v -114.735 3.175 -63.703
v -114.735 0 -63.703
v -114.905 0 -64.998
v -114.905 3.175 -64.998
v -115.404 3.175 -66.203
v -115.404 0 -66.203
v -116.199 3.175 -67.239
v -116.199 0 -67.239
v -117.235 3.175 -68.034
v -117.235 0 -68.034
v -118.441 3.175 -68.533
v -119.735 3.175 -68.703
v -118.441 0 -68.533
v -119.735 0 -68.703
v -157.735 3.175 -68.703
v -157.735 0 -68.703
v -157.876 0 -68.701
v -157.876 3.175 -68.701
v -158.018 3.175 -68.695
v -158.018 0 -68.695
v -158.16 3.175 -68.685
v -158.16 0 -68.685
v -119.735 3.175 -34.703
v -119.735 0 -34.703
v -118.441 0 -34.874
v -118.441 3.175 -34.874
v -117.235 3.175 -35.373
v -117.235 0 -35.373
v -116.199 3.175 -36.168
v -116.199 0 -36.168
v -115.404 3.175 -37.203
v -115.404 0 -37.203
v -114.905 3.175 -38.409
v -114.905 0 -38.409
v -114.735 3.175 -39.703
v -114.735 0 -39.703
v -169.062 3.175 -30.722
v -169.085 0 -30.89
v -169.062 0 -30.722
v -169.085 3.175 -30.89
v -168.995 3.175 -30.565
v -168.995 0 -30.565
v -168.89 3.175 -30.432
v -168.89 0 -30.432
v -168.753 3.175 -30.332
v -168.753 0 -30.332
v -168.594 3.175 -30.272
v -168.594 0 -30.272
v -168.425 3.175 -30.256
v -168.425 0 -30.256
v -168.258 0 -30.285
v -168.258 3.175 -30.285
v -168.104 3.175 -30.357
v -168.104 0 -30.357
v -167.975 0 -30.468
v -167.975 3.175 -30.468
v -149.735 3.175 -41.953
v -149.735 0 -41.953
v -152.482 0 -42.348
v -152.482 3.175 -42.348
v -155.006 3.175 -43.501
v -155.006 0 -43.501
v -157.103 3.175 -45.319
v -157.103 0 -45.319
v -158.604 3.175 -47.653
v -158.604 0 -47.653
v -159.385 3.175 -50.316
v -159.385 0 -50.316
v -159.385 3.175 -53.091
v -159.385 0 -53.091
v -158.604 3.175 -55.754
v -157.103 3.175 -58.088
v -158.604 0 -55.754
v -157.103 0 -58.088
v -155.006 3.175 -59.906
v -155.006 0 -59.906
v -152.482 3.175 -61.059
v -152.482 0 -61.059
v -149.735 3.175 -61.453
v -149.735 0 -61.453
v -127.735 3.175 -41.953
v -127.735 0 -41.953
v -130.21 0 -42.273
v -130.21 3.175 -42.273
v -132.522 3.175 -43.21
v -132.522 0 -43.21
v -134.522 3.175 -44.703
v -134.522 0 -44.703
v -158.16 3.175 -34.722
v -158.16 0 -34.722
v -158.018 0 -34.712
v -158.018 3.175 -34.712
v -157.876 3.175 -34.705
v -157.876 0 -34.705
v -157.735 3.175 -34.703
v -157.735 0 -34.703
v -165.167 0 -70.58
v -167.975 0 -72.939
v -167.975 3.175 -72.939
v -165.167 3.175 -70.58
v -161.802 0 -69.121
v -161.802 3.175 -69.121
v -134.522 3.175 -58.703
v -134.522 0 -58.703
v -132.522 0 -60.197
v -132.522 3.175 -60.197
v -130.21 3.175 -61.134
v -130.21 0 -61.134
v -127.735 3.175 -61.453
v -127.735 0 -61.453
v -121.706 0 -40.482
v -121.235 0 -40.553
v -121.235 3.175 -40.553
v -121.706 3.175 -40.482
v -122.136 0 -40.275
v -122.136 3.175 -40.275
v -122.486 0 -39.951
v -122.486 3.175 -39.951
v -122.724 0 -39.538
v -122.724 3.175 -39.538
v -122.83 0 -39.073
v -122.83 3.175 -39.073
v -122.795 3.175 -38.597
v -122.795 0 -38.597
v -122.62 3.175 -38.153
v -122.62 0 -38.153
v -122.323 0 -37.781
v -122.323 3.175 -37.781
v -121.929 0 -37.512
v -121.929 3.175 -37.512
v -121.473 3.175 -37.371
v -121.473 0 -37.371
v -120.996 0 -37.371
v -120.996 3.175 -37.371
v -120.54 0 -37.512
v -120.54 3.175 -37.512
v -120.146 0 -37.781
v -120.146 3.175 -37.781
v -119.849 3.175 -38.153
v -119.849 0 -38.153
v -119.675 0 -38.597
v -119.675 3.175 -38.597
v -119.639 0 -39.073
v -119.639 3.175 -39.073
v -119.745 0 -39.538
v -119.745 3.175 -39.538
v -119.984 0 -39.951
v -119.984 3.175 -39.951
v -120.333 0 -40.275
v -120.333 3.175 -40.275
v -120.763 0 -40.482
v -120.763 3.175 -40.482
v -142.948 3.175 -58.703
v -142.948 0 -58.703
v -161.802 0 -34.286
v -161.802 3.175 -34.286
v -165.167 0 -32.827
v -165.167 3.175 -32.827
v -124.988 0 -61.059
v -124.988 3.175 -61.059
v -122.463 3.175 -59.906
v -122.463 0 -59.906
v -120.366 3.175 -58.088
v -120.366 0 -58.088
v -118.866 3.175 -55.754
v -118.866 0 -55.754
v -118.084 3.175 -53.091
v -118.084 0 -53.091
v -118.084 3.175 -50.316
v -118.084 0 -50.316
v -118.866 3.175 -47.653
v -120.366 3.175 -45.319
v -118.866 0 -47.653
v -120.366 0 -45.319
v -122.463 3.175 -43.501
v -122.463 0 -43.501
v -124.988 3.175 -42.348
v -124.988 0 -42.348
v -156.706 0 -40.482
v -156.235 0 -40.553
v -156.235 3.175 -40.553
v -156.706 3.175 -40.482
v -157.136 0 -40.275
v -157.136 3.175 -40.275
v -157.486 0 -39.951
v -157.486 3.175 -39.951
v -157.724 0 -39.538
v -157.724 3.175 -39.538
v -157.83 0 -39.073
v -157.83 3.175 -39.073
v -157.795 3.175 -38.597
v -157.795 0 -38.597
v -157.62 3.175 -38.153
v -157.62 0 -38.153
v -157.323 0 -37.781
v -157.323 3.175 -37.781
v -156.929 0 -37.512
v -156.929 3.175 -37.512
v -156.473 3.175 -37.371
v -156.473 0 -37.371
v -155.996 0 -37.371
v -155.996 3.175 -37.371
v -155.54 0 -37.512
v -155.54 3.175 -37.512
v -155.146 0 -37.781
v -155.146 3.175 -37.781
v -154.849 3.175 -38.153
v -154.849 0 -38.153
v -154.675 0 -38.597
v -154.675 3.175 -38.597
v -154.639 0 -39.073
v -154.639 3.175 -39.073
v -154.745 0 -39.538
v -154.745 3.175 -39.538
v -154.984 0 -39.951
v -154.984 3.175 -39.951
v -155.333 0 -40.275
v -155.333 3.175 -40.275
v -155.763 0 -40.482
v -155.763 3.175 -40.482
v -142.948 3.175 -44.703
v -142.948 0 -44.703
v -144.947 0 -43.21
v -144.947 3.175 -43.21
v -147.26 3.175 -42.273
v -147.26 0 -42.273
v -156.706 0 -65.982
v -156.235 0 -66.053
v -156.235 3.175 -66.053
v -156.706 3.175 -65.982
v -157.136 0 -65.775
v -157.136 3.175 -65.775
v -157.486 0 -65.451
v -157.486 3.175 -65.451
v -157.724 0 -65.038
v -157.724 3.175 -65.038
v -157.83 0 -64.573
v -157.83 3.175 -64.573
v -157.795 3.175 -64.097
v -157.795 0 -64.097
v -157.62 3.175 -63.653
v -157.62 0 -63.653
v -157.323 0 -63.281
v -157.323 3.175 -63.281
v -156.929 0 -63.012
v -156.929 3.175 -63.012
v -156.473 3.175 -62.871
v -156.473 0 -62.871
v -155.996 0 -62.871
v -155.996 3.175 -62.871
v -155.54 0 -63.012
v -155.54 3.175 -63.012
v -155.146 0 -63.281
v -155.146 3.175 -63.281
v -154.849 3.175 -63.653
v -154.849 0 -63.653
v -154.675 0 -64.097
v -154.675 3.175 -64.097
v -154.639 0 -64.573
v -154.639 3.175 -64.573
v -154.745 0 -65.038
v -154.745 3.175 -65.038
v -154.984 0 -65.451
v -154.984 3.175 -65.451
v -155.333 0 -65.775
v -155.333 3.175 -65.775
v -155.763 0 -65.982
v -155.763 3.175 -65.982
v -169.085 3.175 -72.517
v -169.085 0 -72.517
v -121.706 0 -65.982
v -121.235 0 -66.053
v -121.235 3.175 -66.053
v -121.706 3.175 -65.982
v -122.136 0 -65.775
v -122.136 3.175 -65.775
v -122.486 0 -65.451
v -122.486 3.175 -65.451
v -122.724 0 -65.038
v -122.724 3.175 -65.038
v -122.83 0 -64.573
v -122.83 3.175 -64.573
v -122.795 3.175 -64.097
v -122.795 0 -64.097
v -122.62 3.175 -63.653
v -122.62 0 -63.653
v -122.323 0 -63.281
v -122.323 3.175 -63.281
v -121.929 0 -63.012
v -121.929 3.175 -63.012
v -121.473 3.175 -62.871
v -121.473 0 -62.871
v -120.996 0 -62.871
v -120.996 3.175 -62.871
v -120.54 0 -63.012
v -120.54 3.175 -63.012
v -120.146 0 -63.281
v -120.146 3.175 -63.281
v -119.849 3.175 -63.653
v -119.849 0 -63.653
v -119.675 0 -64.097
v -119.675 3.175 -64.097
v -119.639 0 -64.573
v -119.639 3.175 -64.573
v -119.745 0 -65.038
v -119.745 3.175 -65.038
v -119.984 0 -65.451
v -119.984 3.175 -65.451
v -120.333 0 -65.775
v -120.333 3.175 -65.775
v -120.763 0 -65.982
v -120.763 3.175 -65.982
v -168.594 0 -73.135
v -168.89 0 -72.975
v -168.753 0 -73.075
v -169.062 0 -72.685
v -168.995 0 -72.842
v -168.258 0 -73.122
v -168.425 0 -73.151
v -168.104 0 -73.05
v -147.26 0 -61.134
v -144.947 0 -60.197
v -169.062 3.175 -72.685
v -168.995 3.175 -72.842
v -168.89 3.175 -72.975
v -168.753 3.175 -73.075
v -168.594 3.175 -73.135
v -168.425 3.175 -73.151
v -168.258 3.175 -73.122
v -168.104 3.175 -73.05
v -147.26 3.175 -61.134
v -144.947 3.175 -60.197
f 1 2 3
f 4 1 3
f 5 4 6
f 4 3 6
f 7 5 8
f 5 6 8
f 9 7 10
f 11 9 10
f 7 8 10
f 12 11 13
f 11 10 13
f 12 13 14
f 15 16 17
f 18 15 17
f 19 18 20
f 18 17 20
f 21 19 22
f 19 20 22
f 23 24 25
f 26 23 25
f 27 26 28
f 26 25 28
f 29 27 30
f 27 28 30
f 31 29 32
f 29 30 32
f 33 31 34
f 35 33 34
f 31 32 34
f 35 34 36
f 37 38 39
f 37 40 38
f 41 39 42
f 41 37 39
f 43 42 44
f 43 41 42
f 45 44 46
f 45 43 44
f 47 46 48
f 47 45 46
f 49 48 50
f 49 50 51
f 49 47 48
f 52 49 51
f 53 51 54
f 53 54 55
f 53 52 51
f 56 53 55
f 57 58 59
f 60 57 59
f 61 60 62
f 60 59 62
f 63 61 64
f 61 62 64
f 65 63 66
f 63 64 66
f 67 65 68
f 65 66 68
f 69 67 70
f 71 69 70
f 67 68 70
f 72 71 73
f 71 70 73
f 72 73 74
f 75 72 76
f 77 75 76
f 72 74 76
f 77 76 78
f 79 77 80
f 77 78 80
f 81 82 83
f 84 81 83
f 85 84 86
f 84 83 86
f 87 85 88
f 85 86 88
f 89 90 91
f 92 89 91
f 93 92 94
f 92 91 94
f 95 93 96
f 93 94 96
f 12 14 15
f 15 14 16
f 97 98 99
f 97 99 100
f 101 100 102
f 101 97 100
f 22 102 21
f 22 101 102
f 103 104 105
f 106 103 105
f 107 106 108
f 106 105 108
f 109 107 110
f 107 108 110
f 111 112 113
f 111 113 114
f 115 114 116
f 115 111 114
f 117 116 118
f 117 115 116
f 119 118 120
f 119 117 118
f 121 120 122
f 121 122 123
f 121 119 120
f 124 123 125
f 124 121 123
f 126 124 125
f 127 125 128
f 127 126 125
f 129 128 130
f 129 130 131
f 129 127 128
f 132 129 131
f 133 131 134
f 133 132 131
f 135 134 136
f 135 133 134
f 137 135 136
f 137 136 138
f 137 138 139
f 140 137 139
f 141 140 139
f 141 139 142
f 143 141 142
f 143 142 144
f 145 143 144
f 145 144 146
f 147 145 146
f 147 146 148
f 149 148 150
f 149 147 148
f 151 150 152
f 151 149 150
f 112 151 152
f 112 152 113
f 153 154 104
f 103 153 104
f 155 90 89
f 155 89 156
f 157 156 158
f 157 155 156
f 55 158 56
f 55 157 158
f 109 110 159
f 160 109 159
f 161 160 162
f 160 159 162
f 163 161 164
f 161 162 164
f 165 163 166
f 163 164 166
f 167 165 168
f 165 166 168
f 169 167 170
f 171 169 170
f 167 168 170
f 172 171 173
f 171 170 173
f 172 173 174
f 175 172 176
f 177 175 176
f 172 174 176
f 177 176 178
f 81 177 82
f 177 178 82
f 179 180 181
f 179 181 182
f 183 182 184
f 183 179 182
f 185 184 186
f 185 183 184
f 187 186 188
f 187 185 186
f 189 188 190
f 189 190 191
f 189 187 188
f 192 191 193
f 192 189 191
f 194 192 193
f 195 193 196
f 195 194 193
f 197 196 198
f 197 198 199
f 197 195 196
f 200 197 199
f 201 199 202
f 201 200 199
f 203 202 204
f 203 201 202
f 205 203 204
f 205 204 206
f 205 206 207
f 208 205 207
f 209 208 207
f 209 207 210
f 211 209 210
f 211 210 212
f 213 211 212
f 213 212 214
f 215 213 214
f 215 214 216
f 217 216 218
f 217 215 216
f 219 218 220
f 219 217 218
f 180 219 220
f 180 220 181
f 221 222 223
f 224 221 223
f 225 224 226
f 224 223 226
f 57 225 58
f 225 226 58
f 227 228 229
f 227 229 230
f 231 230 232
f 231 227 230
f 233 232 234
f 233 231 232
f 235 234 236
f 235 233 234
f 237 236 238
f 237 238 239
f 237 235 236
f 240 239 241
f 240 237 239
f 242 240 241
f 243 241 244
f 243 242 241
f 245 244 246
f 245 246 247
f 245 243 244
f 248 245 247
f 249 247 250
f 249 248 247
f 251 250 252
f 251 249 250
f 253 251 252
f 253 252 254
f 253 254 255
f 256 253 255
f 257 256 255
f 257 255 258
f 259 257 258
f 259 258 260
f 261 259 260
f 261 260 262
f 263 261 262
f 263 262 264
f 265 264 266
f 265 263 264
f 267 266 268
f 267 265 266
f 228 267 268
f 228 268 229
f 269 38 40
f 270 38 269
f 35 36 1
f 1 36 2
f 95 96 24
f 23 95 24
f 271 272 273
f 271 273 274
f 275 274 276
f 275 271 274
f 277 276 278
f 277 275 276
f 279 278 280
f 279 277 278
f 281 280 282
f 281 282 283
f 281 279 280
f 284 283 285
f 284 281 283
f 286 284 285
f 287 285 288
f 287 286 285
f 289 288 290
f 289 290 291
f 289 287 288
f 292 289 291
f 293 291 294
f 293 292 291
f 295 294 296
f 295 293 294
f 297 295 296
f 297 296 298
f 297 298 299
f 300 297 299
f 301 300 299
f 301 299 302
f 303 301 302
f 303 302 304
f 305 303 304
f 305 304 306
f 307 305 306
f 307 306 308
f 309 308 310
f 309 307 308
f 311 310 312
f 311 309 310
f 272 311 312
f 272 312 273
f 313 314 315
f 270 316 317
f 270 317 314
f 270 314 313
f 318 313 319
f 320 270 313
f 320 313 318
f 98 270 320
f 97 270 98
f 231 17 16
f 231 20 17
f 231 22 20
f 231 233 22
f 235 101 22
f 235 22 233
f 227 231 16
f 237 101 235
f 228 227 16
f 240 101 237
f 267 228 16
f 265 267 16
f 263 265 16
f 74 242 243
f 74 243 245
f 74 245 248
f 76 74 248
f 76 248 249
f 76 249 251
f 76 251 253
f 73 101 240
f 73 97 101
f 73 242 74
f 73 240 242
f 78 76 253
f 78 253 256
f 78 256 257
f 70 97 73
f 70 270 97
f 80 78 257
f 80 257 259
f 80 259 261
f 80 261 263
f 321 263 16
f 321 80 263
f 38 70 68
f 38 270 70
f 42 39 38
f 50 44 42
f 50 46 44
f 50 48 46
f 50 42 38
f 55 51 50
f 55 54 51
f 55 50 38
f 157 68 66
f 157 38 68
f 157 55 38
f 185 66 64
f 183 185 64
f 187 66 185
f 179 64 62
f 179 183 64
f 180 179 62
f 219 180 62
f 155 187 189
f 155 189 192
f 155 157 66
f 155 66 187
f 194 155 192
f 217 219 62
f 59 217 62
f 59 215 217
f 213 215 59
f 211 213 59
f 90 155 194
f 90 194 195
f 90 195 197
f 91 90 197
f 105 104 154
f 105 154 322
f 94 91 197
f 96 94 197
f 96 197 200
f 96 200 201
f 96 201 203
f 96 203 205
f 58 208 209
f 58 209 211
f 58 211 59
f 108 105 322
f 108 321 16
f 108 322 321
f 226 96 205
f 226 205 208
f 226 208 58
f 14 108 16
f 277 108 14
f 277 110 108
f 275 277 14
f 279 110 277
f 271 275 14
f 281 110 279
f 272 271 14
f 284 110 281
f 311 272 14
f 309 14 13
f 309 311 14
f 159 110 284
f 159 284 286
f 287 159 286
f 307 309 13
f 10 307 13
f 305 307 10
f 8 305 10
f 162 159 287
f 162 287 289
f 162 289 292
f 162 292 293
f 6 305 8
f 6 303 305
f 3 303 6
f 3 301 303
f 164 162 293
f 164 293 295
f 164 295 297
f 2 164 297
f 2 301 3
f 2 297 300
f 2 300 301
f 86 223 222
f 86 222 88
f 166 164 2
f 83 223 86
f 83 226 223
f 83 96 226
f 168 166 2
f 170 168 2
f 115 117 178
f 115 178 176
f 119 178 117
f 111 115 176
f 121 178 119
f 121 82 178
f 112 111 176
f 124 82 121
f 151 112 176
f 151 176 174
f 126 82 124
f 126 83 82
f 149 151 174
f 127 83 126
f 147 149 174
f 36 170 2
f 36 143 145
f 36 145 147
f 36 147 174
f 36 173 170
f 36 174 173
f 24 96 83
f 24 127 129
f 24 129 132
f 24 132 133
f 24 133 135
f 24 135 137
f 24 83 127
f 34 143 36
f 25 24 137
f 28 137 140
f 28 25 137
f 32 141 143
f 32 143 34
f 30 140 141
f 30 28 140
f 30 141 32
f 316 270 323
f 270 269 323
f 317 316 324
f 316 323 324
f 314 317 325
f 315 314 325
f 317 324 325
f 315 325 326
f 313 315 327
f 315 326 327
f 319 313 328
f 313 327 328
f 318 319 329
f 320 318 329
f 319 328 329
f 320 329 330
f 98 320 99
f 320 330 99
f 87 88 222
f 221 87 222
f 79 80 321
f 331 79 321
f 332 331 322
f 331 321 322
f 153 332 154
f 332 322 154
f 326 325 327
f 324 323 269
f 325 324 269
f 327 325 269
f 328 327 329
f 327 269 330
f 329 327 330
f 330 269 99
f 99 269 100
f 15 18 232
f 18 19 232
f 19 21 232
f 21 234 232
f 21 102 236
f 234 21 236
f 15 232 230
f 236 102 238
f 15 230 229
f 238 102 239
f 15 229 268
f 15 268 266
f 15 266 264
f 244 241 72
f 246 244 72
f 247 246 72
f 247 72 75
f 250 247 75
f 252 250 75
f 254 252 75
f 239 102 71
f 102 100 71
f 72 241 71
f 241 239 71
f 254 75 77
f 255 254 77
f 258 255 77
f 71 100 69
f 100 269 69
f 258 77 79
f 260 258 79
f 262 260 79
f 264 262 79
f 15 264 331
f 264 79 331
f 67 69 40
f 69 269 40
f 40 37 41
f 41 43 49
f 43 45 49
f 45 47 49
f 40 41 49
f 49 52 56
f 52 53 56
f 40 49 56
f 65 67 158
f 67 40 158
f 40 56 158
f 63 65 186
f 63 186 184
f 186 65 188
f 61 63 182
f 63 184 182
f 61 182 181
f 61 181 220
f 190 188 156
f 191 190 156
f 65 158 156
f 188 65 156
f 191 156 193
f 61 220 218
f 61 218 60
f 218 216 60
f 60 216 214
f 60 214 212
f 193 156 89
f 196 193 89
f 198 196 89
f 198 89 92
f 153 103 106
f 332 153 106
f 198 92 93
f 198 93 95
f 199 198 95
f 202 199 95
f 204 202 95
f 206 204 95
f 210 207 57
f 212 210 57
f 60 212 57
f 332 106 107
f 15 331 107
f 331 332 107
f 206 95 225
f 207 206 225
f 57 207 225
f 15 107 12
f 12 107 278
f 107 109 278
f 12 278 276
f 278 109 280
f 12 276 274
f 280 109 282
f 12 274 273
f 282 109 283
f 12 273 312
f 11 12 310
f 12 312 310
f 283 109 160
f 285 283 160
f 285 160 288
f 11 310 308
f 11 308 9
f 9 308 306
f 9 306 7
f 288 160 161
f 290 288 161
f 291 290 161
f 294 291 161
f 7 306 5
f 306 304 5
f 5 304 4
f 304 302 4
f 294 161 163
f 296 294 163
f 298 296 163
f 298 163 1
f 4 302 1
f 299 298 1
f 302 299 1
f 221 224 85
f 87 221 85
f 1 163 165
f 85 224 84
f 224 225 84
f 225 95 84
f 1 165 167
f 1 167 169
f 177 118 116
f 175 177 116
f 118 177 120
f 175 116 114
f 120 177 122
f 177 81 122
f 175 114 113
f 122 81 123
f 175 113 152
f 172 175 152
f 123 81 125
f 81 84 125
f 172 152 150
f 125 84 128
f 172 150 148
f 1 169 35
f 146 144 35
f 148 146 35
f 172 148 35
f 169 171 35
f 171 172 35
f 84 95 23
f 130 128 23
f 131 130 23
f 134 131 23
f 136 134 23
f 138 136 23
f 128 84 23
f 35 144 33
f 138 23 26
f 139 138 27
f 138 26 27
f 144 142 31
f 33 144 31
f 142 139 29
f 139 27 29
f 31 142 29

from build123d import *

# Parameters (mm, degrees)
BOSS_EXTRUDE1_DEPTH = 3.175
BOSS_EXTRUDE2_DEPTH = 3.175
FILLET1_R           = 0.635


with BuildPart() as part:
    # Sketch1 → Boss-Extrude1 (new body)
    with BuildSketch(Plane(origin=(0, 0, 0), x_dir=(1, 0, 0), z_dir=(0, 1, 0))):
        with BuildLine():
            Line((-157.73462252, 34.703486642), (-119.73462252, 34.703486642))
            ThreePointArc((-119.73462252, 34.703486642), (-116.199088614, 36.167952736), (-114.73462252, 39.703486642))
            Line((-114.73462252, 39.703486642), (-114.73462252, 63.703486642))
            ThreePointArc((-114.73462252, 63.703486642), (-116.199088614, 67.239020548), (-119.73462252, 68.703486642))
            Line((-119.73462252, 68.703486642), (-157.73462252, 68.703486642))
            ThreePointArc((-157.73462252, 68.703486642), (-161.270156426, 67.239020548), (-162.73462252, 63.703486642))
            Line((-162.73462252, 63.703486642), (-162.73462252, 39.703486642))
            ThreePointArc((-162.73462252, 39.703486642), (-161.270156426, 36.167952736), (-157.73462252, 34.703486642))
        make_face()
        with BuildLine():
            Line((-134.5215585, 44.703486642), (-142.94768654, 44.703486642))
            ThreePointArc((-142.94768654, 44.703486642), (-146.073167891, 42.667101856), (-149.73462252, 41.953486642))
            ThreePointArc((-149.73462252, 41.953486642), (-159.48462252, 51.703486642), (-149.73462252, 61.453486642))
            ThreePointArc((-149.73462252, 61.453486642), (-146.073167891, 60.739871428), (-142.94768654, 58.703486642))
            Line((-142.94768654, 58.703486642), (-134.5215585, 58.703486642))
            ThreePointArc((-134.5215585, 58.703486642), (-131.396077149, 60.739871428), (-127.73462252, 61.453486642))
            ThreePointArc((-127.73462252, 61.453486642), (-117.98462252, 51.703486642), (-127.73462252, 41.953486642))
            ThreePointArc((-127.73462252, 41.953486642), (-131.396077149, 42.667101856), (-134.5215585, 44.703486642))
        make_face(mode=Mode.SUBTRACT)
        with BuildLine():
            ThreePointArc((-121.23462252, 37.353486642), (-119.63462252, 38.953486642), (-121.23462252, 40.553486642))
            ThreePointArc((-121.23462252, 40.553486642), (-122.83462252, 38.953486642), (-121.23462252, 37.353486642))
        make_face(mode=Mode.SUBTRACT)
        with BuildLine():
            ThreePointArc((-156.23462252, 37.353486642), (-154.63462252, 38.953486642), (-156.23462252, 40.553486642))
            ThreePointArc((-156.23462252, 40.553486642), (-157.83462252, 38.953486642), (-156.23462252, 37.353486642))
        make_face(mode=Mode.SUBTRACT)
        with BuildLine():
            ThreePointArc((-156.23462252, 62.853486642), (-154.63462252, 64.453486642), (-156.23462252, 66.053486642))
            ThreePointArc((-156.23462252, 66.053486642), (-157.83462252, 64.453486642), (-156.23462252, 62.853486642))
        make_face(mode=Mode.SUBTRACT)
        with BuildLine():
            ThreePointArc((-121.23462252, 62.853486642), (-119.63462252, 64.453486642), (-121.23462252, 66.053486642))
            ThreePointArc((-121.23462252, 66.053486642), (-122.83462252, 64.453486642), (-121.23462252, 62.853486642))
        make_face(mode=Mode.SUBTRACT)
    extrude(amount=BOSS_EXTRUDE1_DEPTH)

    # Sketch2 → Boss-Extrude2 (add)
    with BuildSketch(Plane.XZ):
        with BuildLine():
            Line((-169.08462252, -29.024879137), (-169.08462252, -74.382094147))
            ThreePointArc((-169.08462252, -74.382094147), (-164.359232711, -70.120144783), (-158.159635896, -68.685390257))
            ThreePointArc((-158.159635896, -68.685390257), (-161.417357026, -67.085419013), (-162.73462252, -63.703486642))
            Line((-162.73462252, -63.703486642), (-162.73462252, -39.703486642))
            ThreePointArc((-162.73462252, -39.703486642), (-161.417357026, -36.321554271), (-158.159635896, -34.721583027))
            ThreePointArc((-158.159635896, -34.721583027), (-164.359232711, -33.286828501), (-169.08462252, -29.024879137))
        make_face()
    extrude(amount=-BOSS_EXTRUDE2_DEPTH)

    # Fillet1
    fillet1_edges = [part.edges().sort_by_distance(p)[0] for p in [
        (-169.08462252, 1.5875, -74.382094147),
        (-169.08462252, 1.5875, -29.024879137),
    ]]
    fillet(fillet1_edges, radius=FILLET1_R)


solid = part.part
